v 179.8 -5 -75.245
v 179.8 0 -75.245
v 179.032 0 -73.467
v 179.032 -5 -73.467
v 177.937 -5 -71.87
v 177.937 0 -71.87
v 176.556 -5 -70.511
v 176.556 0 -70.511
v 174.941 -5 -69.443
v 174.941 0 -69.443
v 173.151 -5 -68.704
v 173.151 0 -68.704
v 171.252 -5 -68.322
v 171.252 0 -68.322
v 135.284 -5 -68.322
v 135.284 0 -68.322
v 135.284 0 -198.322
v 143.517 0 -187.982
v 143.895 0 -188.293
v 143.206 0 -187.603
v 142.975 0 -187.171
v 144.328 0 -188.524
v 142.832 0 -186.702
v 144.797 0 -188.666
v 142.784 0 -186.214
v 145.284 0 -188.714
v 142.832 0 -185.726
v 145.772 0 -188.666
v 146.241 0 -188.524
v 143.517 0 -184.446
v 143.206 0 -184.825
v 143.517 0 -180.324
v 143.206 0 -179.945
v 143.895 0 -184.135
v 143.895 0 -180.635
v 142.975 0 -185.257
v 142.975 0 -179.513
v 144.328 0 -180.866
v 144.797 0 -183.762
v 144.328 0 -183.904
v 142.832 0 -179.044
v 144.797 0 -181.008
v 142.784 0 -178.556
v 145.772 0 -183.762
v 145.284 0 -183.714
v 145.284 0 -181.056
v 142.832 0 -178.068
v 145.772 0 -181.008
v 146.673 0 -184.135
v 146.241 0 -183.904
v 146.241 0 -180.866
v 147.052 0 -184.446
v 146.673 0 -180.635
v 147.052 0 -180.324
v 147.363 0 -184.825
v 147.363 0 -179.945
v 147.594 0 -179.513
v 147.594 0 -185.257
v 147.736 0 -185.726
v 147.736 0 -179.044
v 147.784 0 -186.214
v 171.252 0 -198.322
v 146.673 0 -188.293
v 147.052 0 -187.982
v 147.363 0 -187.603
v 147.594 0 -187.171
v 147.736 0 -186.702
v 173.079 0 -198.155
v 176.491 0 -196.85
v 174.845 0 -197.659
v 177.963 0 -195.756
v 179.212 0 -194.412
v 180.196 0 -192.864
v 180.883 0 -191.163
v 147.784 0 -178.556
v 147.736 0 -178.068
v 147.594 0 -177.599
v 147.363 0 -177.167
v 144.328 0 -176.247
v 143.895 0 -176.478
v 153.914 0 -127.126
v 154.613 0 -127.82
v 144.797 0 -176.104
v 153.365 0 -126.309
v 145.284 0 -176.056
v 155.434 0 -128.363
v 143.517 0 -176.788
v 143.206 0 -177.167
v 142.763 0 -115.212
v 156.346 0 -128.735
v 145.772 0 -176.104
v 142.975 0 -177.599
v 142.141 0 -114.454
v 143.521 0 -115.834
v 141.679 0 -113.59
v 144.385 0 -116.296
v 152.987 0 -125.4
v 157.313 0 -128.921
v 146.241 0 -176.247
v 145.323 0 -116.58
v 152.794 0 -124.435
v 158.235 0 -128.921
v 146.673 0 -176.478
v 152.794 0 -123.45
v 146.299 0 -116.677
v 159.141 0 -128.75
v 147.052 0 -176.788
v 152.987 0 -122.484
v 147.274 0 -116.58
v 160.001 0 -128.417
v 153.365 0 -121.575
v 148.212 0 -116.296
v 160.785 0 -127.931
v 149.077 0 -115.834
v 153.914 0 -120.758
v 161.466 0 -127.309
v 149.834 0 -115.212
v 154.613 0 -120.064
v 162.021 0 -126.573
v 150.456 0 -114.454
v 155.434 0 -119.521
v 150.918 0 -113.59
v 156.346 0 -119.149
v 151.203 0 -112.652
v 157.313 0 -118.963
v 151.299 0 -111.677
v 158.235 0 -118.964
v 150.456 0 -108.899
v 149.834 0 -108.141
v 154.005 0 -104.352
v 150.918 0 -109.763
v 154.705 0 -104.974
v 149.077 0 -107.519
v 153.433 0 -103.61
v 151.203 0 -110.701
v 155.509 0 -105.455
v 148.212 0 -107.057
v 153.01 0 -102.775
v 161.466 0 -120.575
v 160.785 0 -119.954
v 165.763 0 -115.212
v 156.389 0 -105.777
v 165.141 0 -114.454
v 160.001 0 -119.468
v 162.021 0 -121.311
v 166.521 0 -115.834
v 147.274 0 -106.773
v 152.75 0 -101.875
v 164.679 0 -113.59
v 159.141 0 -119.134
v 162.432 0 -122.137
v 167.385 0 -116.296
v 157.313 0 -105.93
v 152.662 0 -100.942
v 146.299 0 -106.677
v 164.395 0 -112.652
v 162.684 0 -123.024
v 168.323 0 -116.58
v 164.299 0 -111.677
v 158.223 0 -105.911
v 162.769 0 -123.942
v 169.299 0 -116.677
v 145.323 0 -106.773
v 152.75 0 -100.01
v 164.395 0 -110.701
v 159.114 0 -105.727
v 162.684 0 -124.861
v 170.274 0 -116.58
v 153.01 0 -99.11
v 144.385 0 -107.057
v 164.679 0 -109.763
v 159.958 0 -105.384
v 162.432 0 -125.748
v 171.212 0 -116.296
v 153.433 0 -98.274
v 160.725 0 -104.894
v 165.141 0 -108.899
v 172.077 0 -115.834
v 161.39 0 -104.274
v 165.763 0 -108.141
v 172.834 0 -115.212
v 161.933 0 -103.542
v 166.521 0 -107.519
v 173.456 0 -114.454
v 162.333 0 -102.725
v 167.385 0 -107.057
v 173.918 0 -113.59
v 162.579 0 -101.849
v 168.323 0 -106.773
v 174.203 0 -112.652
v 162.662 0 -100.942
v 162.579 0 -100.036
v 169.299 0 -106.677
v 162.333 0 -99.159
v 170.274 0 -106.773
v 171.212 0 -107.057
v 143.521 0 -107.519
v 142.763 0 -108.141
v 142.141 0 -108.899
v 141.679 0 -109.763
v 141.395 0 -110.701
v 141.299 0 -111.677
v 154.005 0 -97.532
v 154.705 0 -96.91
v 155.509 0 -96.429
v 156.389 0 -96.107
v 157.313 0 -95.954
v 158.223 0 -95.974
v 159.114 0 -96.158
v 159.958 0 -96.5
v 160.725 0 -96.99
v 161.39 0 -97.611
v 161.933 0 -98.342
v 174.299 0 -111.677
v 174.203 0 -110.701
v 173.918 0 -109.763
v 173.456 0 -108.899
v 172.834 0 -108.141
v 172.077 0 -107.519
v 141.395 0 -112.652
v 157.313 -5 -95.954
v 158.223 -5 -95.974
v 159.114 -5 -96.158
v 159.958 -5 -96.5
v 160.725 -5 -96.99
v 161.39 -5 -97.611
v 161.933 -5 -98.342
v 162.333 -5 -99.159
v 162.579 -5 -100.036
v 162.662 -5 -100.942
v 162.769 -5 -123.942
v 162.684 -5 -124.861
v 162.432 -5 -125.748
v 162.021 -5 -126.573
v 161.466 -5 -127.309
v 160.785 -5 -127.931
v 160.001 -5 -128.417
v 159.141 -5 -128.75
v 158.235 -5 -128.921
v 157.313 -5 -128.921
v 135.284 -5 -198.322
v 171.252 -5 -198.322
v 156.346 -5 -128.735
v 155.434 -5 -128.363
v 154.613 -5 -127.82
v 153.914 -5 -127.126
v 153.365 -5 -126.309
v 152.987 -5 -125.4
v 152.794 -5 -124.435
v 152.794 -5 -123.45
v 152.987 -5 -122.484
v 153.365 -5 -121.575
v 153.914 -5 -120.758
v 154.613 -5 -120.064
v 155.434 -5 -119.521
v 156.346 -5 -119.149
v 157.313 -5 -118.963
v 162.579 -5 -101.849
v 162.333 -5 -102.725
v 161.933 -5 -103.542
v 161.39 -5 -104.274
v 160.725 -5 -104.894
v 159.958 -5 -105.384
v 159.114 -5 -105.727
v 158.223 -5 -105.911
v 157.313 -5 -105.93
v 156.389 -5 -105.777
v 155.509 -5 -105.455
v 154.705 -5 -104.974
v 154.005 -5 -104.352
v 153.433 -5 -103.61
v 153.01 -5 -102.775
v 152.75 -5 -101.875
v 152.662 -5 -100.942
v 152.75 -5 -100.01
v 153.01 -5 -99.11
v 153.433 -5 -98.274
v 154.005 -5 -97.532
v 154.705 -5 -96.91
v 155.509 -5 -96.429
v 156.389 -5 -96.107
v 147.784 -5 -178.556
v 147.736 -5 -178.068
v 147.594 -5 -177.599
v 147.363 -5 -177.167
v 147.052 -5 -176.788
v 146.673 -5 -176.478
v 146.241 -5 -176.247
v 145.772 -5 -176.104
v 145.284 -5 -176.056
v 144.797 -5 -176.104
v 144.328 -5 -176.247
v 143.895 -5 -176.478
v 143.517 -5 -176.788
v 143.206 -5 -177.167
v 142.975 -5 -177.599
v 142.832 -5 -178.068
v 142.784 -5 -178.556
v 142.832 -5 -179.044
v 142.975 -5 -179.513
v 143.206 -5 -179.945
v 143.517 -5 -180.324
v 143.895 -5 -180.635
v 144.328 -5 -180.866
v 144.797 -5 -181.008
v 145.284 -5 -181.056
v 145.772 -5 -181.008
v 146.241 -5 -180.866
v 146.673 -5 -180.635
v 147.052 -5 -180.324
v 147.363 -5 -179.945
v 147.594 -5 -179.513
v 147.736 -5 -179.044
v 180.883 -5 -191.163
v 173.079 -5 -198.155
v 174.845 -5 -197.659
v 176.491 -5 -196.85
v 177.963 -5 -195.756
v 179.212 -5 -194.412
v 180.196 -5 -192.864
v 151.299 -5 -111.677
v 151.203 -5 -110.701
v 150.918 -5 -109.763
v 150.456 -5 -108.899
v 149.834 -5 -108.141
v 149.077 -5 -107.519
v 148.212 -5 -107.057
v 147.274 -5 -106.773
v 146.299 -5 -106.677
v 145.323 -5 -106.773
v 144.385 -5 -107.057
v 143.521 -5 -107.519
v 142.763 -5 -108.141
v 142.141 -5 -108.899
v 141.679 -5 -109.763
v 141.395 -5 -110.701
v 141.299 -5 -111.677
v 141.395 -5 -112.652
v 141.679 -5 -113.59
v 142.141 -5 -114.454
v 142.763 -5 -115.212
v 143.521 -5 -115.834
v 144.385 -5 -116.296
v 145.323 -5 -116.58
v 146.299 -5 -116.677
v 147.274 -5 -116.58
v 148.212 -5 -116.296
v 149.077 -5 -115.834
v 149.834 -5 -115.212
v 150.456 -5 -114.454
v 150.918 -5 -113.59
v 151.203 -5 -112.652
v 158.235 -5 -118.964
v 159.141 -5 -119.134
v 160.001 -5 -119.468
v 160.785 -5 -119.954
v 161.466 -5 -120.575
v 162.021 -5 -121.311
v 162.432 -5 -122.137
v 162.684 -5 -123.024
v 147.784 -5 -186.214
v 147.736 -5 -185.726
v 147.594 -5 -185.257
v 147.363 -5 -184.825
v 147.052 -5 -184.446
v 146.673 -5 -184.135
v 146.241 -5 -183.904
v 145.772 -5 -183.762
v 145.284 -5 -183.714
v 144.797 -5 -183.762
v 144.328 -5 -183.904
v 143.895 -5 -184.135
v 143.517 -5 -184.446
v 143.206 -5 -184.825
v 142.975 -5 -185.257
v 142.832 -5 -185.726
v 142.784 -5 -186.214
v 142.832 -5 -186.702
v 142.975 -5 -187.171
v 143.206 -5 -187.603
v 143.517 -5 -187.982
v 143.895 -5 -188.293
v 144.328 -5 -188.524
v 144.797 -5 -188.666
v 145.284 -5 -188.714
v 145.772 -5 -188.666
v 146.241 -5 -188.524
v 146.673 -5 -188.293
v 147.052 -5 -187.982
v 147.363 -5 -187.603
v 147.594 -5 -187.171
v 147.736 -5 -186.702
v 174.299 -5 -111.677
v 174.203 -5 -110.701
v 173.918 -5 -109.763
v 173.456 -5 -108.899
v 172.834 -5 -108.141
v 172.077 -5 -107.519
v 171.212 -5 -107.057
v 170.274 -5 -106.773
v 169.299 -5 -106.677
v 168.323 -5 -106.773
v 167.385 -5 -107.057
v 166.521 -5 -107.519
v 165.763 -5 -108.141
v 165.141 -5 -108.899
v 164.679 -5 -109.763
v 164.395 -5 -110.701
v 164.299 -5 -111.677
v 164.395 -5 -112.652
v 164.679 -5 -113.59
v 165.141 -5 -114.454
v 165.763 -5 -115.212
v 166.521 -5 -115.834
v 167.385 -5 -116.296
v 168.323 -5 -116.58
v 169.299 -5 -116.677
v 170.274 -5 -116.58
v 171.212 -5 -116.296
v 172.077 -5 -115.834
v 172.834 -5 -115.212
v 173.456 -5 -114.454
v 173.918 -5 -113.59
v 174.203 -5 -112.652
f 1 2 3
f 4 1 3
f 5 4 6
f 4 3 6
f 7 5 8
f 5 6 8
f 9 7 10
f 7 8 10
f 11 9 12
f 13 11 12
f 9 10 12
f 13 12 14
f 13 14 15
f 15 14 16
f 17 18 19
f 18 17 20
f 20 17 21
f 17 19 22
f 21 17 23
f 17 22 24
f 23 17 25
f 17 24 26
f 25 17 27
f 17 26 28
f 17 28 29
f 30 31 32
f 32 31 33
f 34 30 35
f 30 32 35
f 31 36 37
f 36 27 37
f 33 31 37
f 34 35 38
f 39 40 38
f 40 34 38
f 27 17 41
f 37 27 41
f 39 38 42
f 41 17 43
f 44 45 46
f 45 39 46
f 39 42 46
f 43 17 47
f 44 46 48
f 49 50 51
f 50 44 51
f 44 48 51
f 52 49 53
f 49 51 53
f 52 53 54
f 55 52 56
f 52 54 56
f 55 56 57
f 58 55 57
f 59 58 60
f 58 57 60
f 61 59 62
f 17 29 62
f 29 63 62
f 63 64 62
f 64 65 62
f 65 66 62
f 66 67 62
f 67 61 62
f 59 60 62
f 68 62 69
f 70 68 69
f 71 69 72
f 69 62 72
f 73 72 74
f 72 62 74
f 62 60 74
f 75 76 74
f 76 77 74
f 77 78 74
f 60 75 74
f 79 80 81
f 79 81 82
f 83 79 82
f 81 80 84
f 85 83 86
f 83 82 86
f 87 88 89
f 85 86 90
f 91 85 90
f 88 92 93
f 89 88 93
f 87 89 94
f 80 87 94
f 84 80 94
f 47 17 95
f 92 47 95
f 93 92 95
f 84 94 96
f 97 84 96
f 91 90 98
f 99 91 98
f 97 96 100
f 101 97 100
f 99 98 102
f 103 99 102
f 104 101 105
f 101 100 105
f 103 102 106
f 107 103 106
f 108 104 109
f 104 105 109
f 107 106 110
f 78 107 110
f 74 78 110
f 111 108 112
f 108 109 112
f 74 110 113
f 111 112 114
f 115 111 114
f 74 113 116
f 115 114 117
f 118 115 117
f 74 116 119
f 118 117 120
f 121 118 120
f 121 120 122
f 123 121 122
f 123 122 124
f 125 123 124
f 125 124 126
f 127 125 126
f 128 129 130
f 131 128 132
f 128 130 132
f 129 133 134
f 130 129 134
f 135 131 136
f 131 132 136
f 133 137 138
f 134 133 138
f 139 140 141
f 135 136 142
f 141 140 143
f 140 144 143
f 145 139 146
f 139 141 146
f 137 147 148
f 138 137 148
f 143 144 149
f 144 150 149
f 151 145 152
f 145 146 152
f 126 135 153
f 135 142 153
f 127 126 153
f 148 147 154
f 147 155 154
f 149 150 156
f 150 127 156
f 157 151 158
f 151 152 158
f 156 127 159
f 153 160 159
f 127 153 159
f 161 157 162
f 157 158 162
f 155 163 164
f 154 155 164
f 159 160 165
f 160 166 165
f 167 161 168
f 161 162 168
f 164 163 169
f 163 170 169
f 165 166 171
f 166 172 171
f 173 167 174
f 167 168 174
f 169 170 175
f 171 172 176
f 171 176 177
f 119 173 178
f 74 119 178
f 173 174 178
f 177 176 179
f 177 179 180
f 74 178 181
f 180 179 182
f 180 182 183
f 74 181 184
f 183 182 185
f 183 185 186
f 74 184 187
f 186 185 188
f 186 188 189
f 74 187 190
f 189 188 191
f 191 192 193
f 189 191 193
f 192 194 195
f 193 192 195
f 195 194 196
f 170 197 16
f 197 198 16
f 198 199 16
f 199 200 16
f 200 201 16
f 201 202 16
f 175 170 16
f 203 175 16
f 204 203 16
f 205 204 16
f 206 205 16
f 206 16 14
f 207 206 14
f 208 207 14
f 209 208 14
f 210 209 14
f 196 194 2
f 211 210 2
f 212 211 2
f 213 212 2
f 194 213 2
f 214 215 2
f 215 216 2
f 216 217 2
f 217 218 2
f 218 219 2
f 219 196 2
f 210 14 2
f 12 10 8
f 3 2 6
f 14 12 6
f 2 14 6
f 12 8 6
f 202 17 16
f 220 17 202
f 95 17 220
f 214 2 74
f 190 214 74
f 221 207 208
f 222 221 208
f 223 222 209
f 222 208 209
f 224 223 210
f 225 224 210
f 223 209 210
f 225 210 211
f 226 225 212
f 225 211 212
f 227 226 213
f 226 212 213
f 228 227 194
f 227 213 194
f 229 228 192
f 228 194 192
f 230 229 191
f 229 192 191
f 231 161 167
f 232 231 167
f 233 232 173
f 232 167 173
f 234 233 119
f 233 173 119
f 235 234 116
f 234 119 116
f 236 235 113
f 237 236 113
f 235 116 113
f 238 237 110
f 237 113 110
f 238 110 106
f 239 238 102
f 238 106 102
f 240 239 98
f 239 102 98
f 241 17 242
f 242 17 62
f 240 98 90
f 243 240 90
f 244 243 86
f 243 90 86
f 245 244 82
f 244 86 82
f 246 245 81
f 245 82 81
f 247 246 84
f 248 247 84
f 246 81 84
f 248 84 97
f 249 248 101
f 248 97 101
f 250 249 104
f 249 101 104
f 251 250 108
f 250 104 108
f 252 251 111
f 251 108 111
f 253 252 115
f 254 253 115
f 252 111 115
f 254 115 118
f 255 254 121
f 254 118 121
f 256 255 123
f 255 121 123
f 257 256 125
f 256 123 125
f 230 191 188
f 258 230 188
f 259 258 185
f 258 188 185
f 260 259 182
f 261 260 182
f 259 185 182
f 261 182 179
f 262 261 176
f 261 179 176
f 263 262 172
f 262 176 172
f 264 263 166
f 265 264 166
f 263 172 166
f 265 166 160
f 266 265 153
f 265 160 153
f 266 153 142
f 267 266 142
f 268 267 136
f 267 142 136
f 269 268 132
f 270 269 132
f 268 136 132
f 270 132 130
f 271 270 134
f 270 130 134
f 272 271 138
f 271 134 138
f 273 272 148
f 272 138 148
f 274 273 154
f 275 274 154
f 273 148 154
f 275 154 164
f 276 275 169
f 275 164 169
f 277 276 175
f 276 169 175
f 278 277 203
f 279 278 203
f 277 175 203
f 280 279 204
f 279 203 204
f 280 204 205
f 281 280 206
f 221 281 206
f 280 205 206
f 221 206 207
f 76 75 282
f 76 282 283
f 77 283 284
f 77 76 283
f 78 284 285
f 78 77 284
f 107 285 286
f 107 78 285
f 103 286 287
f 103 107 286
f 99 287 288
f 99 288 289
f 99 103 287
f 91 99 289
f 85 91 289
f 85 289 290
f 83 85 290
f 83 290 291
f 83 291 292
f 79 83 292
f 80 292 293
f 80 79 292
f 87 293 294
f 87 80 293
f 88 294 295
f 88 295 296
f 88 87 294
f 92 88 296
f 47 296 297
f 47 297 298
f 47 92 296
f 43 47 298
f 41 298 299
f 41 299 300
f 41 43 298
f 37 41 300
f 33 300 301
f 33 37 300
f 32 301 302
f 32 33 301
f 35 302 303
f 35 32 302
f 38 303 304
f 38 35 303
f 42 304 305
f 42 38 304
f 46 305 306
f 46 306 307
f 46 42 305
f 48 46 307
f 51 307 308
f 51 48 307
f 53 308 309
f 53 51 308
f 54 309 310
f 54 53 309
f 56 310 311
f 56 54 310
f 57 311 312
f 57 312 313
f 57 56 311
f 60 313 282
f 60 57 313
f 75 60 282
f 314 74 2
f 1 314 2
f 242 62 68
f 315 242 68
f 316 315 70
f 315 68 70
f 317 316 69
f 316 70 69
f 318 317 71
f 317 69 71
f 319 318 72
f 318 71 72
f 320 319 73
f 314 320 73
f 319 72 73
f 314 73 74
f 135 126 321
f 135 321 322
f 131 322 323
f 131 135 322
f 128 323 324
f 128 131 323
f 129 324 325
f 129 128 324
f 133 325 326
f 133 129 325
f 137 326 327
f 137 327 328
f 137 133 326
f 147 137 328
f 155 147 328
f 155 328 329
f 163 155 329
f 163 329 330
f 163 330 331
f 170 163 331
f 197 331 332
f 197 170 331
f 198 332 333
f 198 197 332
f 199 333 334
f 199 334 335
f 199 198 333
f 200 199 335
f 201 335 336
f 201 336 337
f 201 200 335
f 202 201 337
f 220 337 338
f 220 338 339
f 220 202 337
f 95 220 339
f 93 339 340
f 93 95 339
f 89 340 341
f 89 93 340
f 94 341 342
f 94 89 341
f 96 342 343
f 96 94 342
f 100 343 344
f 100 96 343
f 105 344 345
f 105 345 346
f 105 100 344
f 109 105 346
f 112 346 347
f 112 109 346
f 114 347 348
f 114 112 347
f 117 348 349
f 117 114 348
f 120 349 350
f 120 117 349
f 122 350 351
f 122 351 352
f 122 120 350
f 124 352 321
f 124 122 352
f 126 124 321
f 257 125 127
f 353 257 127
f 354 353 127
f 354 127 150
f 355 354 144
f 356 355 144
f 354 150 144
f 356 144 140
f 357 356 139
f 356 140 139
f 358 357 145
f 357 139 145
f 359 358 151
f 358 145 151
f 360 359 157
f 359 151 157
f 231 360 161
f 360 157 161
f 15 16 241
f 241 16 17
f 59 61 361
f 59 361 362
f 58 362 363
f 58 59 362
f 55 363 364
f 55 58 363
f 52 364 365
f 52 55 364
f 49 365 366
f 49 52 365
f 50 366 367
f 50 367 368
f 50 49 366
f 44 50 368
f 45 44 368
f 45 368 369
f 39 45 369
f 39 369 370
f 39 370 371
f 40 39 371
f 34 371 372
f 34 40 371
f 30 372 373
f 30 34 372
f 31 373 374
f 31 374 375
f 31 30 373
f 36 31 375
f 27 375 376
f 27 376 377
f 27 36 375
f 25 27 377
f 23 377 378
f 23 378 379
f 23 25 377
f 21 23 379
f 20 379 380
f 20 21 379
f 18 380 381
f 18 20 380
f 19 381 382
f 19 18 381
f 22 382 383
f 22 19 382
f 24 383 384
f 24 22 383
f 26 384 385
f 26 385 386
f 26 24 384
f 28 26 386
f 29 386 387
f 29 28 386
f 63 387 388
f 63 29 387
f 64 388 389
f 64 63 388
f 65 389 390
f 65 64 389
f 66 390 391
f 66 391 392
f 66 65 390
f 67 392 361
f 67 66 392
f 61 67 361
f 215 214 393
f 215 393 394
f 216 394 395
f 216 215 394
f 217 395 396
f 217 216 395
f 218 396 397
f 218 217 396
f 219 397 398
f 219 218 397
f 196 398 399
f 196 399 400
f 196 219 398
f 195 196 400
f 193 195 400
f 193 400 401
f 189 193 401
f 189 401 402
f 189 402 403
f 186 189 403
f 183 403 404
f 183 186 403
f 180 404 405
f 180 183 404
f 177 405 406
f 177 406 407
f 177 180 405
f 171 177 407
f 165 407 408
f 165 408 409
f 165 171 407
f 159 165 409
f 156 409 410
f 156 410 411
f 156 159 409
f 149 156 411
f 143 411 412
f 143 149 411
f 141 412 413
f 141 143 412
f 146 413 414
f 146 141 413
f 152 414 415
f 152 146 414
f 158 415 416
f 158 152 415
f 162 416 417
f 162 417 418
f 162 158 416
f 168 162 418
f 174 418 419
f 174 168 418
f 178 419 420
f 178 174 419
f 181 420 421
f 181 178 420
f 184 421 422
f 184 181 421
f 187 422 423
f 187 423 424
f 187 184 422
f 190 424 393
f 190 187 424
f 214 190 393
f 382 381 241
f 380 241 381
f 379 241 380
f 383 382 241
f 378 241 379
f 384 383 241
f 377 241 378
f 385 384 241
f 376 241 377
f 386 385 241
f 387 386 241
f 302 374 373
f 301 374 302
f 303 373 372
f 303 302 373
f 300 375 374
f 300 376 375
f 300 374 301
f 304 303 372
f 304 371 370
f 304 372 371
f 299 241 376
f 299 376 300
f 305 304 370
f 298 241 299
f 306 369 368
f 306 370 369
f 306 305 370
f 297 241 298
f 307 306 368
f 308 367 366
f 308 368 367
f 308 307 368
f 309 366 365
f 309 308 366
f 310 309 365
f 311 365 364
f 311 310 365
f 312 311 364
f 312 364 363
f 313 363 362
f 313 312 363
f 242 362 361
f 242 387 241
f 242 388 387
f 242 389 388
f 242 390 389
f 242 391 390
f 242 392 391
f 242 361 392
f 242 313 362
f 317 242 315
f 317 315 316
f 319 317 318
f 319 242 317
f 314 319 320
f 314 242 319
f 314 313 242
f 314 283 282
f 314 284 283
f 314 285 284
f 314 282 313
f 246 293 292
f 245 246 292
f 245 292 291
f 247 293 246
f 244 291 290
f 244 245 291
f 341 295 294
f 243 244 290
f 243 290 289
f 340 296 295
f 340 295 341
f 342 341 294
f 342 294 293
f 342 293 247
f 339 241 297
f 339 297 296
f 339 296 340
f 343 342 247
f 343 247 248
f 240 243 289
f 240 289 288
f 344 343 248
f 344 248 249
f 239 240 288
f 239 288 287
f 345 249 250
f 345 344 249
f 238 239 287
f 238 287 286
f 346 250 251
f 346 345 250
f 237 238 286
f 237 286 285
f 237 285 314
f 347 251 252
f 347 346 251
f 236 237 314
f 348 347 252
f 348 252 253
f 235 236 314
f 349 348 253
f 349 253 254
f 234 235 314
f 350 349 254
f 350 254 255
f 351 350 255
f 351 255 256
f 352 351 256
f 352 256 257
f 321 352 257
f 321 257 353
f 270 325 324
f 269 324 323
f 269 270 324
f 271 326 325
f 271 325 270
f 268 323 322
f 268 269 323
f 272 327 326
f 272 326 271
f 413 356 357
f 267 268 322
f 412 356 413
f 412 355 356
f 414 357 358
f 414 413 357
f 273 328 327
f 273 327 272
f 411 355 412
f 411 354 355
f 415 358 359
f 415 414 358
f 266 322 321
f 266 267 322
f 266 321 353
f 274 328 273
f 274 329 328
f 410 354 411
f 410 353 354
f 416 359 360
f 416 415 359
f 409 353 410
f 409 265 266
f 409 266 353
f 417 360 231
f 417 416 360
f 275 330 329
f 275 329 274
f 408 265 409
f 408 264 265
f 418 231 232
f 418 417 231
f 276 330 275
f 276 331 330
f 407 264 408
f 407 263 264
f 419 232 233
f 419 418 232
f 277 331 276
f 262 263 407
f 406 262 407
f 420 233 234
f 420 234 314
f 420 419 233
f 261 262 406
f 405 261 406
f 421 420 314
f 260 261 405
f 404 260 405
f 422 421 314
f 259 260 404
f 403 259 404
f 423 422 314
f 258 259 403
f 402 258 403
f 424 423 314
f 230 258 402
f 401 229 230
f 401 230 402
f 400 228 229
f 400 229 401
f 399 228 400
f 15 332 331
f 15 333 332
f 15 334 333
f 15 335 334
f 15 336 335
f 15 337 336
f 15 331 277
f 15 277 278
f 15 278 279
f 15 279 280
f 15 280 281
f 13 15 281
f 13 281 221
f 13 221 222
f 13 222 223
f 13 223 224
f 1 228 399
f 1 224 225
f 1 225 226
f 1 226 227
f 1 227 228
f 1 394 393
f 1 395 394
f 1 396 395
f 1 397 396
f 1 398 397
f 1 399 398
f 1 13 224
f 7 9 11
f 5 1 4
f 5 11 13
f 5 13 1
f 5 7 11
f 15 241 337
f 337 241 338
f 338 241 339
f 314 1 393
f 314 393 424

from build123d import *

# Parameters (mm, degrees)
F0_R     = 2.5
F0_R_2   = 5
F1_DEPTH = 5


with BuildPart() as f1:
    # F0 (on Front) → F1 (new body)
    with BuildSketch(Plane.XZ):
        with BuildLine():
            Line((135.28383, -68.32226), (135.28383, -198.32226))
            Line((135.28383, -198.32226), (157.312748, -198.32226))
            Line((157.312748, -198.32226), (157.312748, -128.921397))
            ThreePointArc((157.312748, -128.921397), (152.769318, -123.942286), (157.312748, -118.963175))
            Line((157.312748, -118.963175), (157.312748, -105.930082))
            ThreePointArc((157.312748, -105.930082), (152.661874, -100.942286), (157.312748, -95.95449))
            Line((157.312748, -95.95449), (157.312748, -68.32226))
            Line((157.312748, -68.32226), (135.28383, -68.32226))
        make_face()
        with Locations((145.284414, -186.214134)):
            Circle(F0_R, mode=Mode.SUBTRACT)
        with Locations((145.284414, -178.556204)):
            Circle(F0_R, mode=Mode.SUBTRACT)
        with Locations((146.29881, -111.676522)):
            Circle(F0_R_2, mode=Mode.SUBTRACT)
        with BuildLine():
            Line((157.312748, -128.921397), (157.312748, -198.32226))
            Line((157.312748, -198.32226), (171.252168, -198.32226))
            ThreePointArc((171.252168, -198.32226), (177.252168, -196.336497), (180.882853, -191.163356))
            Line((180.882853, -191.163356), (179.799825, -75.244784))
            ThreePointArc((179.799825, -75.244784), (176.556179, -70.511493), (171.252168, -68.32226))
            Line((171.252168, -68.32226), (157.312748, -68.32226))
            Line((157.312748, -68.32226), (157.312748, -95.95449))
            ThreePointArc((157.312748, -95.95449), (161.07174, -97.2854), (162.661874, -100.942286))
            ThreePointArc((162.661874, -100.942286), (161.07174, -104.599172), (157.312748, -105.930082))
            Line((157.312748, -105.930082), (157.312748, -118.963175))
            ThreePointArc((157.312748, -118.963175), (161.139567, -120.248856), (162.769318, -123.942286))
            ThreePointArc((162.769318, -123.942286), (161.139567, -127.635716), (157.312748, -128.921397))
        make_face()
        with Locations((169.29881, -111.676522)):
            Circle(F0_R_2, mode=Mode.SUBTRACT)
    extrude(amount=F1_DEPTH)


solid = f1.part
